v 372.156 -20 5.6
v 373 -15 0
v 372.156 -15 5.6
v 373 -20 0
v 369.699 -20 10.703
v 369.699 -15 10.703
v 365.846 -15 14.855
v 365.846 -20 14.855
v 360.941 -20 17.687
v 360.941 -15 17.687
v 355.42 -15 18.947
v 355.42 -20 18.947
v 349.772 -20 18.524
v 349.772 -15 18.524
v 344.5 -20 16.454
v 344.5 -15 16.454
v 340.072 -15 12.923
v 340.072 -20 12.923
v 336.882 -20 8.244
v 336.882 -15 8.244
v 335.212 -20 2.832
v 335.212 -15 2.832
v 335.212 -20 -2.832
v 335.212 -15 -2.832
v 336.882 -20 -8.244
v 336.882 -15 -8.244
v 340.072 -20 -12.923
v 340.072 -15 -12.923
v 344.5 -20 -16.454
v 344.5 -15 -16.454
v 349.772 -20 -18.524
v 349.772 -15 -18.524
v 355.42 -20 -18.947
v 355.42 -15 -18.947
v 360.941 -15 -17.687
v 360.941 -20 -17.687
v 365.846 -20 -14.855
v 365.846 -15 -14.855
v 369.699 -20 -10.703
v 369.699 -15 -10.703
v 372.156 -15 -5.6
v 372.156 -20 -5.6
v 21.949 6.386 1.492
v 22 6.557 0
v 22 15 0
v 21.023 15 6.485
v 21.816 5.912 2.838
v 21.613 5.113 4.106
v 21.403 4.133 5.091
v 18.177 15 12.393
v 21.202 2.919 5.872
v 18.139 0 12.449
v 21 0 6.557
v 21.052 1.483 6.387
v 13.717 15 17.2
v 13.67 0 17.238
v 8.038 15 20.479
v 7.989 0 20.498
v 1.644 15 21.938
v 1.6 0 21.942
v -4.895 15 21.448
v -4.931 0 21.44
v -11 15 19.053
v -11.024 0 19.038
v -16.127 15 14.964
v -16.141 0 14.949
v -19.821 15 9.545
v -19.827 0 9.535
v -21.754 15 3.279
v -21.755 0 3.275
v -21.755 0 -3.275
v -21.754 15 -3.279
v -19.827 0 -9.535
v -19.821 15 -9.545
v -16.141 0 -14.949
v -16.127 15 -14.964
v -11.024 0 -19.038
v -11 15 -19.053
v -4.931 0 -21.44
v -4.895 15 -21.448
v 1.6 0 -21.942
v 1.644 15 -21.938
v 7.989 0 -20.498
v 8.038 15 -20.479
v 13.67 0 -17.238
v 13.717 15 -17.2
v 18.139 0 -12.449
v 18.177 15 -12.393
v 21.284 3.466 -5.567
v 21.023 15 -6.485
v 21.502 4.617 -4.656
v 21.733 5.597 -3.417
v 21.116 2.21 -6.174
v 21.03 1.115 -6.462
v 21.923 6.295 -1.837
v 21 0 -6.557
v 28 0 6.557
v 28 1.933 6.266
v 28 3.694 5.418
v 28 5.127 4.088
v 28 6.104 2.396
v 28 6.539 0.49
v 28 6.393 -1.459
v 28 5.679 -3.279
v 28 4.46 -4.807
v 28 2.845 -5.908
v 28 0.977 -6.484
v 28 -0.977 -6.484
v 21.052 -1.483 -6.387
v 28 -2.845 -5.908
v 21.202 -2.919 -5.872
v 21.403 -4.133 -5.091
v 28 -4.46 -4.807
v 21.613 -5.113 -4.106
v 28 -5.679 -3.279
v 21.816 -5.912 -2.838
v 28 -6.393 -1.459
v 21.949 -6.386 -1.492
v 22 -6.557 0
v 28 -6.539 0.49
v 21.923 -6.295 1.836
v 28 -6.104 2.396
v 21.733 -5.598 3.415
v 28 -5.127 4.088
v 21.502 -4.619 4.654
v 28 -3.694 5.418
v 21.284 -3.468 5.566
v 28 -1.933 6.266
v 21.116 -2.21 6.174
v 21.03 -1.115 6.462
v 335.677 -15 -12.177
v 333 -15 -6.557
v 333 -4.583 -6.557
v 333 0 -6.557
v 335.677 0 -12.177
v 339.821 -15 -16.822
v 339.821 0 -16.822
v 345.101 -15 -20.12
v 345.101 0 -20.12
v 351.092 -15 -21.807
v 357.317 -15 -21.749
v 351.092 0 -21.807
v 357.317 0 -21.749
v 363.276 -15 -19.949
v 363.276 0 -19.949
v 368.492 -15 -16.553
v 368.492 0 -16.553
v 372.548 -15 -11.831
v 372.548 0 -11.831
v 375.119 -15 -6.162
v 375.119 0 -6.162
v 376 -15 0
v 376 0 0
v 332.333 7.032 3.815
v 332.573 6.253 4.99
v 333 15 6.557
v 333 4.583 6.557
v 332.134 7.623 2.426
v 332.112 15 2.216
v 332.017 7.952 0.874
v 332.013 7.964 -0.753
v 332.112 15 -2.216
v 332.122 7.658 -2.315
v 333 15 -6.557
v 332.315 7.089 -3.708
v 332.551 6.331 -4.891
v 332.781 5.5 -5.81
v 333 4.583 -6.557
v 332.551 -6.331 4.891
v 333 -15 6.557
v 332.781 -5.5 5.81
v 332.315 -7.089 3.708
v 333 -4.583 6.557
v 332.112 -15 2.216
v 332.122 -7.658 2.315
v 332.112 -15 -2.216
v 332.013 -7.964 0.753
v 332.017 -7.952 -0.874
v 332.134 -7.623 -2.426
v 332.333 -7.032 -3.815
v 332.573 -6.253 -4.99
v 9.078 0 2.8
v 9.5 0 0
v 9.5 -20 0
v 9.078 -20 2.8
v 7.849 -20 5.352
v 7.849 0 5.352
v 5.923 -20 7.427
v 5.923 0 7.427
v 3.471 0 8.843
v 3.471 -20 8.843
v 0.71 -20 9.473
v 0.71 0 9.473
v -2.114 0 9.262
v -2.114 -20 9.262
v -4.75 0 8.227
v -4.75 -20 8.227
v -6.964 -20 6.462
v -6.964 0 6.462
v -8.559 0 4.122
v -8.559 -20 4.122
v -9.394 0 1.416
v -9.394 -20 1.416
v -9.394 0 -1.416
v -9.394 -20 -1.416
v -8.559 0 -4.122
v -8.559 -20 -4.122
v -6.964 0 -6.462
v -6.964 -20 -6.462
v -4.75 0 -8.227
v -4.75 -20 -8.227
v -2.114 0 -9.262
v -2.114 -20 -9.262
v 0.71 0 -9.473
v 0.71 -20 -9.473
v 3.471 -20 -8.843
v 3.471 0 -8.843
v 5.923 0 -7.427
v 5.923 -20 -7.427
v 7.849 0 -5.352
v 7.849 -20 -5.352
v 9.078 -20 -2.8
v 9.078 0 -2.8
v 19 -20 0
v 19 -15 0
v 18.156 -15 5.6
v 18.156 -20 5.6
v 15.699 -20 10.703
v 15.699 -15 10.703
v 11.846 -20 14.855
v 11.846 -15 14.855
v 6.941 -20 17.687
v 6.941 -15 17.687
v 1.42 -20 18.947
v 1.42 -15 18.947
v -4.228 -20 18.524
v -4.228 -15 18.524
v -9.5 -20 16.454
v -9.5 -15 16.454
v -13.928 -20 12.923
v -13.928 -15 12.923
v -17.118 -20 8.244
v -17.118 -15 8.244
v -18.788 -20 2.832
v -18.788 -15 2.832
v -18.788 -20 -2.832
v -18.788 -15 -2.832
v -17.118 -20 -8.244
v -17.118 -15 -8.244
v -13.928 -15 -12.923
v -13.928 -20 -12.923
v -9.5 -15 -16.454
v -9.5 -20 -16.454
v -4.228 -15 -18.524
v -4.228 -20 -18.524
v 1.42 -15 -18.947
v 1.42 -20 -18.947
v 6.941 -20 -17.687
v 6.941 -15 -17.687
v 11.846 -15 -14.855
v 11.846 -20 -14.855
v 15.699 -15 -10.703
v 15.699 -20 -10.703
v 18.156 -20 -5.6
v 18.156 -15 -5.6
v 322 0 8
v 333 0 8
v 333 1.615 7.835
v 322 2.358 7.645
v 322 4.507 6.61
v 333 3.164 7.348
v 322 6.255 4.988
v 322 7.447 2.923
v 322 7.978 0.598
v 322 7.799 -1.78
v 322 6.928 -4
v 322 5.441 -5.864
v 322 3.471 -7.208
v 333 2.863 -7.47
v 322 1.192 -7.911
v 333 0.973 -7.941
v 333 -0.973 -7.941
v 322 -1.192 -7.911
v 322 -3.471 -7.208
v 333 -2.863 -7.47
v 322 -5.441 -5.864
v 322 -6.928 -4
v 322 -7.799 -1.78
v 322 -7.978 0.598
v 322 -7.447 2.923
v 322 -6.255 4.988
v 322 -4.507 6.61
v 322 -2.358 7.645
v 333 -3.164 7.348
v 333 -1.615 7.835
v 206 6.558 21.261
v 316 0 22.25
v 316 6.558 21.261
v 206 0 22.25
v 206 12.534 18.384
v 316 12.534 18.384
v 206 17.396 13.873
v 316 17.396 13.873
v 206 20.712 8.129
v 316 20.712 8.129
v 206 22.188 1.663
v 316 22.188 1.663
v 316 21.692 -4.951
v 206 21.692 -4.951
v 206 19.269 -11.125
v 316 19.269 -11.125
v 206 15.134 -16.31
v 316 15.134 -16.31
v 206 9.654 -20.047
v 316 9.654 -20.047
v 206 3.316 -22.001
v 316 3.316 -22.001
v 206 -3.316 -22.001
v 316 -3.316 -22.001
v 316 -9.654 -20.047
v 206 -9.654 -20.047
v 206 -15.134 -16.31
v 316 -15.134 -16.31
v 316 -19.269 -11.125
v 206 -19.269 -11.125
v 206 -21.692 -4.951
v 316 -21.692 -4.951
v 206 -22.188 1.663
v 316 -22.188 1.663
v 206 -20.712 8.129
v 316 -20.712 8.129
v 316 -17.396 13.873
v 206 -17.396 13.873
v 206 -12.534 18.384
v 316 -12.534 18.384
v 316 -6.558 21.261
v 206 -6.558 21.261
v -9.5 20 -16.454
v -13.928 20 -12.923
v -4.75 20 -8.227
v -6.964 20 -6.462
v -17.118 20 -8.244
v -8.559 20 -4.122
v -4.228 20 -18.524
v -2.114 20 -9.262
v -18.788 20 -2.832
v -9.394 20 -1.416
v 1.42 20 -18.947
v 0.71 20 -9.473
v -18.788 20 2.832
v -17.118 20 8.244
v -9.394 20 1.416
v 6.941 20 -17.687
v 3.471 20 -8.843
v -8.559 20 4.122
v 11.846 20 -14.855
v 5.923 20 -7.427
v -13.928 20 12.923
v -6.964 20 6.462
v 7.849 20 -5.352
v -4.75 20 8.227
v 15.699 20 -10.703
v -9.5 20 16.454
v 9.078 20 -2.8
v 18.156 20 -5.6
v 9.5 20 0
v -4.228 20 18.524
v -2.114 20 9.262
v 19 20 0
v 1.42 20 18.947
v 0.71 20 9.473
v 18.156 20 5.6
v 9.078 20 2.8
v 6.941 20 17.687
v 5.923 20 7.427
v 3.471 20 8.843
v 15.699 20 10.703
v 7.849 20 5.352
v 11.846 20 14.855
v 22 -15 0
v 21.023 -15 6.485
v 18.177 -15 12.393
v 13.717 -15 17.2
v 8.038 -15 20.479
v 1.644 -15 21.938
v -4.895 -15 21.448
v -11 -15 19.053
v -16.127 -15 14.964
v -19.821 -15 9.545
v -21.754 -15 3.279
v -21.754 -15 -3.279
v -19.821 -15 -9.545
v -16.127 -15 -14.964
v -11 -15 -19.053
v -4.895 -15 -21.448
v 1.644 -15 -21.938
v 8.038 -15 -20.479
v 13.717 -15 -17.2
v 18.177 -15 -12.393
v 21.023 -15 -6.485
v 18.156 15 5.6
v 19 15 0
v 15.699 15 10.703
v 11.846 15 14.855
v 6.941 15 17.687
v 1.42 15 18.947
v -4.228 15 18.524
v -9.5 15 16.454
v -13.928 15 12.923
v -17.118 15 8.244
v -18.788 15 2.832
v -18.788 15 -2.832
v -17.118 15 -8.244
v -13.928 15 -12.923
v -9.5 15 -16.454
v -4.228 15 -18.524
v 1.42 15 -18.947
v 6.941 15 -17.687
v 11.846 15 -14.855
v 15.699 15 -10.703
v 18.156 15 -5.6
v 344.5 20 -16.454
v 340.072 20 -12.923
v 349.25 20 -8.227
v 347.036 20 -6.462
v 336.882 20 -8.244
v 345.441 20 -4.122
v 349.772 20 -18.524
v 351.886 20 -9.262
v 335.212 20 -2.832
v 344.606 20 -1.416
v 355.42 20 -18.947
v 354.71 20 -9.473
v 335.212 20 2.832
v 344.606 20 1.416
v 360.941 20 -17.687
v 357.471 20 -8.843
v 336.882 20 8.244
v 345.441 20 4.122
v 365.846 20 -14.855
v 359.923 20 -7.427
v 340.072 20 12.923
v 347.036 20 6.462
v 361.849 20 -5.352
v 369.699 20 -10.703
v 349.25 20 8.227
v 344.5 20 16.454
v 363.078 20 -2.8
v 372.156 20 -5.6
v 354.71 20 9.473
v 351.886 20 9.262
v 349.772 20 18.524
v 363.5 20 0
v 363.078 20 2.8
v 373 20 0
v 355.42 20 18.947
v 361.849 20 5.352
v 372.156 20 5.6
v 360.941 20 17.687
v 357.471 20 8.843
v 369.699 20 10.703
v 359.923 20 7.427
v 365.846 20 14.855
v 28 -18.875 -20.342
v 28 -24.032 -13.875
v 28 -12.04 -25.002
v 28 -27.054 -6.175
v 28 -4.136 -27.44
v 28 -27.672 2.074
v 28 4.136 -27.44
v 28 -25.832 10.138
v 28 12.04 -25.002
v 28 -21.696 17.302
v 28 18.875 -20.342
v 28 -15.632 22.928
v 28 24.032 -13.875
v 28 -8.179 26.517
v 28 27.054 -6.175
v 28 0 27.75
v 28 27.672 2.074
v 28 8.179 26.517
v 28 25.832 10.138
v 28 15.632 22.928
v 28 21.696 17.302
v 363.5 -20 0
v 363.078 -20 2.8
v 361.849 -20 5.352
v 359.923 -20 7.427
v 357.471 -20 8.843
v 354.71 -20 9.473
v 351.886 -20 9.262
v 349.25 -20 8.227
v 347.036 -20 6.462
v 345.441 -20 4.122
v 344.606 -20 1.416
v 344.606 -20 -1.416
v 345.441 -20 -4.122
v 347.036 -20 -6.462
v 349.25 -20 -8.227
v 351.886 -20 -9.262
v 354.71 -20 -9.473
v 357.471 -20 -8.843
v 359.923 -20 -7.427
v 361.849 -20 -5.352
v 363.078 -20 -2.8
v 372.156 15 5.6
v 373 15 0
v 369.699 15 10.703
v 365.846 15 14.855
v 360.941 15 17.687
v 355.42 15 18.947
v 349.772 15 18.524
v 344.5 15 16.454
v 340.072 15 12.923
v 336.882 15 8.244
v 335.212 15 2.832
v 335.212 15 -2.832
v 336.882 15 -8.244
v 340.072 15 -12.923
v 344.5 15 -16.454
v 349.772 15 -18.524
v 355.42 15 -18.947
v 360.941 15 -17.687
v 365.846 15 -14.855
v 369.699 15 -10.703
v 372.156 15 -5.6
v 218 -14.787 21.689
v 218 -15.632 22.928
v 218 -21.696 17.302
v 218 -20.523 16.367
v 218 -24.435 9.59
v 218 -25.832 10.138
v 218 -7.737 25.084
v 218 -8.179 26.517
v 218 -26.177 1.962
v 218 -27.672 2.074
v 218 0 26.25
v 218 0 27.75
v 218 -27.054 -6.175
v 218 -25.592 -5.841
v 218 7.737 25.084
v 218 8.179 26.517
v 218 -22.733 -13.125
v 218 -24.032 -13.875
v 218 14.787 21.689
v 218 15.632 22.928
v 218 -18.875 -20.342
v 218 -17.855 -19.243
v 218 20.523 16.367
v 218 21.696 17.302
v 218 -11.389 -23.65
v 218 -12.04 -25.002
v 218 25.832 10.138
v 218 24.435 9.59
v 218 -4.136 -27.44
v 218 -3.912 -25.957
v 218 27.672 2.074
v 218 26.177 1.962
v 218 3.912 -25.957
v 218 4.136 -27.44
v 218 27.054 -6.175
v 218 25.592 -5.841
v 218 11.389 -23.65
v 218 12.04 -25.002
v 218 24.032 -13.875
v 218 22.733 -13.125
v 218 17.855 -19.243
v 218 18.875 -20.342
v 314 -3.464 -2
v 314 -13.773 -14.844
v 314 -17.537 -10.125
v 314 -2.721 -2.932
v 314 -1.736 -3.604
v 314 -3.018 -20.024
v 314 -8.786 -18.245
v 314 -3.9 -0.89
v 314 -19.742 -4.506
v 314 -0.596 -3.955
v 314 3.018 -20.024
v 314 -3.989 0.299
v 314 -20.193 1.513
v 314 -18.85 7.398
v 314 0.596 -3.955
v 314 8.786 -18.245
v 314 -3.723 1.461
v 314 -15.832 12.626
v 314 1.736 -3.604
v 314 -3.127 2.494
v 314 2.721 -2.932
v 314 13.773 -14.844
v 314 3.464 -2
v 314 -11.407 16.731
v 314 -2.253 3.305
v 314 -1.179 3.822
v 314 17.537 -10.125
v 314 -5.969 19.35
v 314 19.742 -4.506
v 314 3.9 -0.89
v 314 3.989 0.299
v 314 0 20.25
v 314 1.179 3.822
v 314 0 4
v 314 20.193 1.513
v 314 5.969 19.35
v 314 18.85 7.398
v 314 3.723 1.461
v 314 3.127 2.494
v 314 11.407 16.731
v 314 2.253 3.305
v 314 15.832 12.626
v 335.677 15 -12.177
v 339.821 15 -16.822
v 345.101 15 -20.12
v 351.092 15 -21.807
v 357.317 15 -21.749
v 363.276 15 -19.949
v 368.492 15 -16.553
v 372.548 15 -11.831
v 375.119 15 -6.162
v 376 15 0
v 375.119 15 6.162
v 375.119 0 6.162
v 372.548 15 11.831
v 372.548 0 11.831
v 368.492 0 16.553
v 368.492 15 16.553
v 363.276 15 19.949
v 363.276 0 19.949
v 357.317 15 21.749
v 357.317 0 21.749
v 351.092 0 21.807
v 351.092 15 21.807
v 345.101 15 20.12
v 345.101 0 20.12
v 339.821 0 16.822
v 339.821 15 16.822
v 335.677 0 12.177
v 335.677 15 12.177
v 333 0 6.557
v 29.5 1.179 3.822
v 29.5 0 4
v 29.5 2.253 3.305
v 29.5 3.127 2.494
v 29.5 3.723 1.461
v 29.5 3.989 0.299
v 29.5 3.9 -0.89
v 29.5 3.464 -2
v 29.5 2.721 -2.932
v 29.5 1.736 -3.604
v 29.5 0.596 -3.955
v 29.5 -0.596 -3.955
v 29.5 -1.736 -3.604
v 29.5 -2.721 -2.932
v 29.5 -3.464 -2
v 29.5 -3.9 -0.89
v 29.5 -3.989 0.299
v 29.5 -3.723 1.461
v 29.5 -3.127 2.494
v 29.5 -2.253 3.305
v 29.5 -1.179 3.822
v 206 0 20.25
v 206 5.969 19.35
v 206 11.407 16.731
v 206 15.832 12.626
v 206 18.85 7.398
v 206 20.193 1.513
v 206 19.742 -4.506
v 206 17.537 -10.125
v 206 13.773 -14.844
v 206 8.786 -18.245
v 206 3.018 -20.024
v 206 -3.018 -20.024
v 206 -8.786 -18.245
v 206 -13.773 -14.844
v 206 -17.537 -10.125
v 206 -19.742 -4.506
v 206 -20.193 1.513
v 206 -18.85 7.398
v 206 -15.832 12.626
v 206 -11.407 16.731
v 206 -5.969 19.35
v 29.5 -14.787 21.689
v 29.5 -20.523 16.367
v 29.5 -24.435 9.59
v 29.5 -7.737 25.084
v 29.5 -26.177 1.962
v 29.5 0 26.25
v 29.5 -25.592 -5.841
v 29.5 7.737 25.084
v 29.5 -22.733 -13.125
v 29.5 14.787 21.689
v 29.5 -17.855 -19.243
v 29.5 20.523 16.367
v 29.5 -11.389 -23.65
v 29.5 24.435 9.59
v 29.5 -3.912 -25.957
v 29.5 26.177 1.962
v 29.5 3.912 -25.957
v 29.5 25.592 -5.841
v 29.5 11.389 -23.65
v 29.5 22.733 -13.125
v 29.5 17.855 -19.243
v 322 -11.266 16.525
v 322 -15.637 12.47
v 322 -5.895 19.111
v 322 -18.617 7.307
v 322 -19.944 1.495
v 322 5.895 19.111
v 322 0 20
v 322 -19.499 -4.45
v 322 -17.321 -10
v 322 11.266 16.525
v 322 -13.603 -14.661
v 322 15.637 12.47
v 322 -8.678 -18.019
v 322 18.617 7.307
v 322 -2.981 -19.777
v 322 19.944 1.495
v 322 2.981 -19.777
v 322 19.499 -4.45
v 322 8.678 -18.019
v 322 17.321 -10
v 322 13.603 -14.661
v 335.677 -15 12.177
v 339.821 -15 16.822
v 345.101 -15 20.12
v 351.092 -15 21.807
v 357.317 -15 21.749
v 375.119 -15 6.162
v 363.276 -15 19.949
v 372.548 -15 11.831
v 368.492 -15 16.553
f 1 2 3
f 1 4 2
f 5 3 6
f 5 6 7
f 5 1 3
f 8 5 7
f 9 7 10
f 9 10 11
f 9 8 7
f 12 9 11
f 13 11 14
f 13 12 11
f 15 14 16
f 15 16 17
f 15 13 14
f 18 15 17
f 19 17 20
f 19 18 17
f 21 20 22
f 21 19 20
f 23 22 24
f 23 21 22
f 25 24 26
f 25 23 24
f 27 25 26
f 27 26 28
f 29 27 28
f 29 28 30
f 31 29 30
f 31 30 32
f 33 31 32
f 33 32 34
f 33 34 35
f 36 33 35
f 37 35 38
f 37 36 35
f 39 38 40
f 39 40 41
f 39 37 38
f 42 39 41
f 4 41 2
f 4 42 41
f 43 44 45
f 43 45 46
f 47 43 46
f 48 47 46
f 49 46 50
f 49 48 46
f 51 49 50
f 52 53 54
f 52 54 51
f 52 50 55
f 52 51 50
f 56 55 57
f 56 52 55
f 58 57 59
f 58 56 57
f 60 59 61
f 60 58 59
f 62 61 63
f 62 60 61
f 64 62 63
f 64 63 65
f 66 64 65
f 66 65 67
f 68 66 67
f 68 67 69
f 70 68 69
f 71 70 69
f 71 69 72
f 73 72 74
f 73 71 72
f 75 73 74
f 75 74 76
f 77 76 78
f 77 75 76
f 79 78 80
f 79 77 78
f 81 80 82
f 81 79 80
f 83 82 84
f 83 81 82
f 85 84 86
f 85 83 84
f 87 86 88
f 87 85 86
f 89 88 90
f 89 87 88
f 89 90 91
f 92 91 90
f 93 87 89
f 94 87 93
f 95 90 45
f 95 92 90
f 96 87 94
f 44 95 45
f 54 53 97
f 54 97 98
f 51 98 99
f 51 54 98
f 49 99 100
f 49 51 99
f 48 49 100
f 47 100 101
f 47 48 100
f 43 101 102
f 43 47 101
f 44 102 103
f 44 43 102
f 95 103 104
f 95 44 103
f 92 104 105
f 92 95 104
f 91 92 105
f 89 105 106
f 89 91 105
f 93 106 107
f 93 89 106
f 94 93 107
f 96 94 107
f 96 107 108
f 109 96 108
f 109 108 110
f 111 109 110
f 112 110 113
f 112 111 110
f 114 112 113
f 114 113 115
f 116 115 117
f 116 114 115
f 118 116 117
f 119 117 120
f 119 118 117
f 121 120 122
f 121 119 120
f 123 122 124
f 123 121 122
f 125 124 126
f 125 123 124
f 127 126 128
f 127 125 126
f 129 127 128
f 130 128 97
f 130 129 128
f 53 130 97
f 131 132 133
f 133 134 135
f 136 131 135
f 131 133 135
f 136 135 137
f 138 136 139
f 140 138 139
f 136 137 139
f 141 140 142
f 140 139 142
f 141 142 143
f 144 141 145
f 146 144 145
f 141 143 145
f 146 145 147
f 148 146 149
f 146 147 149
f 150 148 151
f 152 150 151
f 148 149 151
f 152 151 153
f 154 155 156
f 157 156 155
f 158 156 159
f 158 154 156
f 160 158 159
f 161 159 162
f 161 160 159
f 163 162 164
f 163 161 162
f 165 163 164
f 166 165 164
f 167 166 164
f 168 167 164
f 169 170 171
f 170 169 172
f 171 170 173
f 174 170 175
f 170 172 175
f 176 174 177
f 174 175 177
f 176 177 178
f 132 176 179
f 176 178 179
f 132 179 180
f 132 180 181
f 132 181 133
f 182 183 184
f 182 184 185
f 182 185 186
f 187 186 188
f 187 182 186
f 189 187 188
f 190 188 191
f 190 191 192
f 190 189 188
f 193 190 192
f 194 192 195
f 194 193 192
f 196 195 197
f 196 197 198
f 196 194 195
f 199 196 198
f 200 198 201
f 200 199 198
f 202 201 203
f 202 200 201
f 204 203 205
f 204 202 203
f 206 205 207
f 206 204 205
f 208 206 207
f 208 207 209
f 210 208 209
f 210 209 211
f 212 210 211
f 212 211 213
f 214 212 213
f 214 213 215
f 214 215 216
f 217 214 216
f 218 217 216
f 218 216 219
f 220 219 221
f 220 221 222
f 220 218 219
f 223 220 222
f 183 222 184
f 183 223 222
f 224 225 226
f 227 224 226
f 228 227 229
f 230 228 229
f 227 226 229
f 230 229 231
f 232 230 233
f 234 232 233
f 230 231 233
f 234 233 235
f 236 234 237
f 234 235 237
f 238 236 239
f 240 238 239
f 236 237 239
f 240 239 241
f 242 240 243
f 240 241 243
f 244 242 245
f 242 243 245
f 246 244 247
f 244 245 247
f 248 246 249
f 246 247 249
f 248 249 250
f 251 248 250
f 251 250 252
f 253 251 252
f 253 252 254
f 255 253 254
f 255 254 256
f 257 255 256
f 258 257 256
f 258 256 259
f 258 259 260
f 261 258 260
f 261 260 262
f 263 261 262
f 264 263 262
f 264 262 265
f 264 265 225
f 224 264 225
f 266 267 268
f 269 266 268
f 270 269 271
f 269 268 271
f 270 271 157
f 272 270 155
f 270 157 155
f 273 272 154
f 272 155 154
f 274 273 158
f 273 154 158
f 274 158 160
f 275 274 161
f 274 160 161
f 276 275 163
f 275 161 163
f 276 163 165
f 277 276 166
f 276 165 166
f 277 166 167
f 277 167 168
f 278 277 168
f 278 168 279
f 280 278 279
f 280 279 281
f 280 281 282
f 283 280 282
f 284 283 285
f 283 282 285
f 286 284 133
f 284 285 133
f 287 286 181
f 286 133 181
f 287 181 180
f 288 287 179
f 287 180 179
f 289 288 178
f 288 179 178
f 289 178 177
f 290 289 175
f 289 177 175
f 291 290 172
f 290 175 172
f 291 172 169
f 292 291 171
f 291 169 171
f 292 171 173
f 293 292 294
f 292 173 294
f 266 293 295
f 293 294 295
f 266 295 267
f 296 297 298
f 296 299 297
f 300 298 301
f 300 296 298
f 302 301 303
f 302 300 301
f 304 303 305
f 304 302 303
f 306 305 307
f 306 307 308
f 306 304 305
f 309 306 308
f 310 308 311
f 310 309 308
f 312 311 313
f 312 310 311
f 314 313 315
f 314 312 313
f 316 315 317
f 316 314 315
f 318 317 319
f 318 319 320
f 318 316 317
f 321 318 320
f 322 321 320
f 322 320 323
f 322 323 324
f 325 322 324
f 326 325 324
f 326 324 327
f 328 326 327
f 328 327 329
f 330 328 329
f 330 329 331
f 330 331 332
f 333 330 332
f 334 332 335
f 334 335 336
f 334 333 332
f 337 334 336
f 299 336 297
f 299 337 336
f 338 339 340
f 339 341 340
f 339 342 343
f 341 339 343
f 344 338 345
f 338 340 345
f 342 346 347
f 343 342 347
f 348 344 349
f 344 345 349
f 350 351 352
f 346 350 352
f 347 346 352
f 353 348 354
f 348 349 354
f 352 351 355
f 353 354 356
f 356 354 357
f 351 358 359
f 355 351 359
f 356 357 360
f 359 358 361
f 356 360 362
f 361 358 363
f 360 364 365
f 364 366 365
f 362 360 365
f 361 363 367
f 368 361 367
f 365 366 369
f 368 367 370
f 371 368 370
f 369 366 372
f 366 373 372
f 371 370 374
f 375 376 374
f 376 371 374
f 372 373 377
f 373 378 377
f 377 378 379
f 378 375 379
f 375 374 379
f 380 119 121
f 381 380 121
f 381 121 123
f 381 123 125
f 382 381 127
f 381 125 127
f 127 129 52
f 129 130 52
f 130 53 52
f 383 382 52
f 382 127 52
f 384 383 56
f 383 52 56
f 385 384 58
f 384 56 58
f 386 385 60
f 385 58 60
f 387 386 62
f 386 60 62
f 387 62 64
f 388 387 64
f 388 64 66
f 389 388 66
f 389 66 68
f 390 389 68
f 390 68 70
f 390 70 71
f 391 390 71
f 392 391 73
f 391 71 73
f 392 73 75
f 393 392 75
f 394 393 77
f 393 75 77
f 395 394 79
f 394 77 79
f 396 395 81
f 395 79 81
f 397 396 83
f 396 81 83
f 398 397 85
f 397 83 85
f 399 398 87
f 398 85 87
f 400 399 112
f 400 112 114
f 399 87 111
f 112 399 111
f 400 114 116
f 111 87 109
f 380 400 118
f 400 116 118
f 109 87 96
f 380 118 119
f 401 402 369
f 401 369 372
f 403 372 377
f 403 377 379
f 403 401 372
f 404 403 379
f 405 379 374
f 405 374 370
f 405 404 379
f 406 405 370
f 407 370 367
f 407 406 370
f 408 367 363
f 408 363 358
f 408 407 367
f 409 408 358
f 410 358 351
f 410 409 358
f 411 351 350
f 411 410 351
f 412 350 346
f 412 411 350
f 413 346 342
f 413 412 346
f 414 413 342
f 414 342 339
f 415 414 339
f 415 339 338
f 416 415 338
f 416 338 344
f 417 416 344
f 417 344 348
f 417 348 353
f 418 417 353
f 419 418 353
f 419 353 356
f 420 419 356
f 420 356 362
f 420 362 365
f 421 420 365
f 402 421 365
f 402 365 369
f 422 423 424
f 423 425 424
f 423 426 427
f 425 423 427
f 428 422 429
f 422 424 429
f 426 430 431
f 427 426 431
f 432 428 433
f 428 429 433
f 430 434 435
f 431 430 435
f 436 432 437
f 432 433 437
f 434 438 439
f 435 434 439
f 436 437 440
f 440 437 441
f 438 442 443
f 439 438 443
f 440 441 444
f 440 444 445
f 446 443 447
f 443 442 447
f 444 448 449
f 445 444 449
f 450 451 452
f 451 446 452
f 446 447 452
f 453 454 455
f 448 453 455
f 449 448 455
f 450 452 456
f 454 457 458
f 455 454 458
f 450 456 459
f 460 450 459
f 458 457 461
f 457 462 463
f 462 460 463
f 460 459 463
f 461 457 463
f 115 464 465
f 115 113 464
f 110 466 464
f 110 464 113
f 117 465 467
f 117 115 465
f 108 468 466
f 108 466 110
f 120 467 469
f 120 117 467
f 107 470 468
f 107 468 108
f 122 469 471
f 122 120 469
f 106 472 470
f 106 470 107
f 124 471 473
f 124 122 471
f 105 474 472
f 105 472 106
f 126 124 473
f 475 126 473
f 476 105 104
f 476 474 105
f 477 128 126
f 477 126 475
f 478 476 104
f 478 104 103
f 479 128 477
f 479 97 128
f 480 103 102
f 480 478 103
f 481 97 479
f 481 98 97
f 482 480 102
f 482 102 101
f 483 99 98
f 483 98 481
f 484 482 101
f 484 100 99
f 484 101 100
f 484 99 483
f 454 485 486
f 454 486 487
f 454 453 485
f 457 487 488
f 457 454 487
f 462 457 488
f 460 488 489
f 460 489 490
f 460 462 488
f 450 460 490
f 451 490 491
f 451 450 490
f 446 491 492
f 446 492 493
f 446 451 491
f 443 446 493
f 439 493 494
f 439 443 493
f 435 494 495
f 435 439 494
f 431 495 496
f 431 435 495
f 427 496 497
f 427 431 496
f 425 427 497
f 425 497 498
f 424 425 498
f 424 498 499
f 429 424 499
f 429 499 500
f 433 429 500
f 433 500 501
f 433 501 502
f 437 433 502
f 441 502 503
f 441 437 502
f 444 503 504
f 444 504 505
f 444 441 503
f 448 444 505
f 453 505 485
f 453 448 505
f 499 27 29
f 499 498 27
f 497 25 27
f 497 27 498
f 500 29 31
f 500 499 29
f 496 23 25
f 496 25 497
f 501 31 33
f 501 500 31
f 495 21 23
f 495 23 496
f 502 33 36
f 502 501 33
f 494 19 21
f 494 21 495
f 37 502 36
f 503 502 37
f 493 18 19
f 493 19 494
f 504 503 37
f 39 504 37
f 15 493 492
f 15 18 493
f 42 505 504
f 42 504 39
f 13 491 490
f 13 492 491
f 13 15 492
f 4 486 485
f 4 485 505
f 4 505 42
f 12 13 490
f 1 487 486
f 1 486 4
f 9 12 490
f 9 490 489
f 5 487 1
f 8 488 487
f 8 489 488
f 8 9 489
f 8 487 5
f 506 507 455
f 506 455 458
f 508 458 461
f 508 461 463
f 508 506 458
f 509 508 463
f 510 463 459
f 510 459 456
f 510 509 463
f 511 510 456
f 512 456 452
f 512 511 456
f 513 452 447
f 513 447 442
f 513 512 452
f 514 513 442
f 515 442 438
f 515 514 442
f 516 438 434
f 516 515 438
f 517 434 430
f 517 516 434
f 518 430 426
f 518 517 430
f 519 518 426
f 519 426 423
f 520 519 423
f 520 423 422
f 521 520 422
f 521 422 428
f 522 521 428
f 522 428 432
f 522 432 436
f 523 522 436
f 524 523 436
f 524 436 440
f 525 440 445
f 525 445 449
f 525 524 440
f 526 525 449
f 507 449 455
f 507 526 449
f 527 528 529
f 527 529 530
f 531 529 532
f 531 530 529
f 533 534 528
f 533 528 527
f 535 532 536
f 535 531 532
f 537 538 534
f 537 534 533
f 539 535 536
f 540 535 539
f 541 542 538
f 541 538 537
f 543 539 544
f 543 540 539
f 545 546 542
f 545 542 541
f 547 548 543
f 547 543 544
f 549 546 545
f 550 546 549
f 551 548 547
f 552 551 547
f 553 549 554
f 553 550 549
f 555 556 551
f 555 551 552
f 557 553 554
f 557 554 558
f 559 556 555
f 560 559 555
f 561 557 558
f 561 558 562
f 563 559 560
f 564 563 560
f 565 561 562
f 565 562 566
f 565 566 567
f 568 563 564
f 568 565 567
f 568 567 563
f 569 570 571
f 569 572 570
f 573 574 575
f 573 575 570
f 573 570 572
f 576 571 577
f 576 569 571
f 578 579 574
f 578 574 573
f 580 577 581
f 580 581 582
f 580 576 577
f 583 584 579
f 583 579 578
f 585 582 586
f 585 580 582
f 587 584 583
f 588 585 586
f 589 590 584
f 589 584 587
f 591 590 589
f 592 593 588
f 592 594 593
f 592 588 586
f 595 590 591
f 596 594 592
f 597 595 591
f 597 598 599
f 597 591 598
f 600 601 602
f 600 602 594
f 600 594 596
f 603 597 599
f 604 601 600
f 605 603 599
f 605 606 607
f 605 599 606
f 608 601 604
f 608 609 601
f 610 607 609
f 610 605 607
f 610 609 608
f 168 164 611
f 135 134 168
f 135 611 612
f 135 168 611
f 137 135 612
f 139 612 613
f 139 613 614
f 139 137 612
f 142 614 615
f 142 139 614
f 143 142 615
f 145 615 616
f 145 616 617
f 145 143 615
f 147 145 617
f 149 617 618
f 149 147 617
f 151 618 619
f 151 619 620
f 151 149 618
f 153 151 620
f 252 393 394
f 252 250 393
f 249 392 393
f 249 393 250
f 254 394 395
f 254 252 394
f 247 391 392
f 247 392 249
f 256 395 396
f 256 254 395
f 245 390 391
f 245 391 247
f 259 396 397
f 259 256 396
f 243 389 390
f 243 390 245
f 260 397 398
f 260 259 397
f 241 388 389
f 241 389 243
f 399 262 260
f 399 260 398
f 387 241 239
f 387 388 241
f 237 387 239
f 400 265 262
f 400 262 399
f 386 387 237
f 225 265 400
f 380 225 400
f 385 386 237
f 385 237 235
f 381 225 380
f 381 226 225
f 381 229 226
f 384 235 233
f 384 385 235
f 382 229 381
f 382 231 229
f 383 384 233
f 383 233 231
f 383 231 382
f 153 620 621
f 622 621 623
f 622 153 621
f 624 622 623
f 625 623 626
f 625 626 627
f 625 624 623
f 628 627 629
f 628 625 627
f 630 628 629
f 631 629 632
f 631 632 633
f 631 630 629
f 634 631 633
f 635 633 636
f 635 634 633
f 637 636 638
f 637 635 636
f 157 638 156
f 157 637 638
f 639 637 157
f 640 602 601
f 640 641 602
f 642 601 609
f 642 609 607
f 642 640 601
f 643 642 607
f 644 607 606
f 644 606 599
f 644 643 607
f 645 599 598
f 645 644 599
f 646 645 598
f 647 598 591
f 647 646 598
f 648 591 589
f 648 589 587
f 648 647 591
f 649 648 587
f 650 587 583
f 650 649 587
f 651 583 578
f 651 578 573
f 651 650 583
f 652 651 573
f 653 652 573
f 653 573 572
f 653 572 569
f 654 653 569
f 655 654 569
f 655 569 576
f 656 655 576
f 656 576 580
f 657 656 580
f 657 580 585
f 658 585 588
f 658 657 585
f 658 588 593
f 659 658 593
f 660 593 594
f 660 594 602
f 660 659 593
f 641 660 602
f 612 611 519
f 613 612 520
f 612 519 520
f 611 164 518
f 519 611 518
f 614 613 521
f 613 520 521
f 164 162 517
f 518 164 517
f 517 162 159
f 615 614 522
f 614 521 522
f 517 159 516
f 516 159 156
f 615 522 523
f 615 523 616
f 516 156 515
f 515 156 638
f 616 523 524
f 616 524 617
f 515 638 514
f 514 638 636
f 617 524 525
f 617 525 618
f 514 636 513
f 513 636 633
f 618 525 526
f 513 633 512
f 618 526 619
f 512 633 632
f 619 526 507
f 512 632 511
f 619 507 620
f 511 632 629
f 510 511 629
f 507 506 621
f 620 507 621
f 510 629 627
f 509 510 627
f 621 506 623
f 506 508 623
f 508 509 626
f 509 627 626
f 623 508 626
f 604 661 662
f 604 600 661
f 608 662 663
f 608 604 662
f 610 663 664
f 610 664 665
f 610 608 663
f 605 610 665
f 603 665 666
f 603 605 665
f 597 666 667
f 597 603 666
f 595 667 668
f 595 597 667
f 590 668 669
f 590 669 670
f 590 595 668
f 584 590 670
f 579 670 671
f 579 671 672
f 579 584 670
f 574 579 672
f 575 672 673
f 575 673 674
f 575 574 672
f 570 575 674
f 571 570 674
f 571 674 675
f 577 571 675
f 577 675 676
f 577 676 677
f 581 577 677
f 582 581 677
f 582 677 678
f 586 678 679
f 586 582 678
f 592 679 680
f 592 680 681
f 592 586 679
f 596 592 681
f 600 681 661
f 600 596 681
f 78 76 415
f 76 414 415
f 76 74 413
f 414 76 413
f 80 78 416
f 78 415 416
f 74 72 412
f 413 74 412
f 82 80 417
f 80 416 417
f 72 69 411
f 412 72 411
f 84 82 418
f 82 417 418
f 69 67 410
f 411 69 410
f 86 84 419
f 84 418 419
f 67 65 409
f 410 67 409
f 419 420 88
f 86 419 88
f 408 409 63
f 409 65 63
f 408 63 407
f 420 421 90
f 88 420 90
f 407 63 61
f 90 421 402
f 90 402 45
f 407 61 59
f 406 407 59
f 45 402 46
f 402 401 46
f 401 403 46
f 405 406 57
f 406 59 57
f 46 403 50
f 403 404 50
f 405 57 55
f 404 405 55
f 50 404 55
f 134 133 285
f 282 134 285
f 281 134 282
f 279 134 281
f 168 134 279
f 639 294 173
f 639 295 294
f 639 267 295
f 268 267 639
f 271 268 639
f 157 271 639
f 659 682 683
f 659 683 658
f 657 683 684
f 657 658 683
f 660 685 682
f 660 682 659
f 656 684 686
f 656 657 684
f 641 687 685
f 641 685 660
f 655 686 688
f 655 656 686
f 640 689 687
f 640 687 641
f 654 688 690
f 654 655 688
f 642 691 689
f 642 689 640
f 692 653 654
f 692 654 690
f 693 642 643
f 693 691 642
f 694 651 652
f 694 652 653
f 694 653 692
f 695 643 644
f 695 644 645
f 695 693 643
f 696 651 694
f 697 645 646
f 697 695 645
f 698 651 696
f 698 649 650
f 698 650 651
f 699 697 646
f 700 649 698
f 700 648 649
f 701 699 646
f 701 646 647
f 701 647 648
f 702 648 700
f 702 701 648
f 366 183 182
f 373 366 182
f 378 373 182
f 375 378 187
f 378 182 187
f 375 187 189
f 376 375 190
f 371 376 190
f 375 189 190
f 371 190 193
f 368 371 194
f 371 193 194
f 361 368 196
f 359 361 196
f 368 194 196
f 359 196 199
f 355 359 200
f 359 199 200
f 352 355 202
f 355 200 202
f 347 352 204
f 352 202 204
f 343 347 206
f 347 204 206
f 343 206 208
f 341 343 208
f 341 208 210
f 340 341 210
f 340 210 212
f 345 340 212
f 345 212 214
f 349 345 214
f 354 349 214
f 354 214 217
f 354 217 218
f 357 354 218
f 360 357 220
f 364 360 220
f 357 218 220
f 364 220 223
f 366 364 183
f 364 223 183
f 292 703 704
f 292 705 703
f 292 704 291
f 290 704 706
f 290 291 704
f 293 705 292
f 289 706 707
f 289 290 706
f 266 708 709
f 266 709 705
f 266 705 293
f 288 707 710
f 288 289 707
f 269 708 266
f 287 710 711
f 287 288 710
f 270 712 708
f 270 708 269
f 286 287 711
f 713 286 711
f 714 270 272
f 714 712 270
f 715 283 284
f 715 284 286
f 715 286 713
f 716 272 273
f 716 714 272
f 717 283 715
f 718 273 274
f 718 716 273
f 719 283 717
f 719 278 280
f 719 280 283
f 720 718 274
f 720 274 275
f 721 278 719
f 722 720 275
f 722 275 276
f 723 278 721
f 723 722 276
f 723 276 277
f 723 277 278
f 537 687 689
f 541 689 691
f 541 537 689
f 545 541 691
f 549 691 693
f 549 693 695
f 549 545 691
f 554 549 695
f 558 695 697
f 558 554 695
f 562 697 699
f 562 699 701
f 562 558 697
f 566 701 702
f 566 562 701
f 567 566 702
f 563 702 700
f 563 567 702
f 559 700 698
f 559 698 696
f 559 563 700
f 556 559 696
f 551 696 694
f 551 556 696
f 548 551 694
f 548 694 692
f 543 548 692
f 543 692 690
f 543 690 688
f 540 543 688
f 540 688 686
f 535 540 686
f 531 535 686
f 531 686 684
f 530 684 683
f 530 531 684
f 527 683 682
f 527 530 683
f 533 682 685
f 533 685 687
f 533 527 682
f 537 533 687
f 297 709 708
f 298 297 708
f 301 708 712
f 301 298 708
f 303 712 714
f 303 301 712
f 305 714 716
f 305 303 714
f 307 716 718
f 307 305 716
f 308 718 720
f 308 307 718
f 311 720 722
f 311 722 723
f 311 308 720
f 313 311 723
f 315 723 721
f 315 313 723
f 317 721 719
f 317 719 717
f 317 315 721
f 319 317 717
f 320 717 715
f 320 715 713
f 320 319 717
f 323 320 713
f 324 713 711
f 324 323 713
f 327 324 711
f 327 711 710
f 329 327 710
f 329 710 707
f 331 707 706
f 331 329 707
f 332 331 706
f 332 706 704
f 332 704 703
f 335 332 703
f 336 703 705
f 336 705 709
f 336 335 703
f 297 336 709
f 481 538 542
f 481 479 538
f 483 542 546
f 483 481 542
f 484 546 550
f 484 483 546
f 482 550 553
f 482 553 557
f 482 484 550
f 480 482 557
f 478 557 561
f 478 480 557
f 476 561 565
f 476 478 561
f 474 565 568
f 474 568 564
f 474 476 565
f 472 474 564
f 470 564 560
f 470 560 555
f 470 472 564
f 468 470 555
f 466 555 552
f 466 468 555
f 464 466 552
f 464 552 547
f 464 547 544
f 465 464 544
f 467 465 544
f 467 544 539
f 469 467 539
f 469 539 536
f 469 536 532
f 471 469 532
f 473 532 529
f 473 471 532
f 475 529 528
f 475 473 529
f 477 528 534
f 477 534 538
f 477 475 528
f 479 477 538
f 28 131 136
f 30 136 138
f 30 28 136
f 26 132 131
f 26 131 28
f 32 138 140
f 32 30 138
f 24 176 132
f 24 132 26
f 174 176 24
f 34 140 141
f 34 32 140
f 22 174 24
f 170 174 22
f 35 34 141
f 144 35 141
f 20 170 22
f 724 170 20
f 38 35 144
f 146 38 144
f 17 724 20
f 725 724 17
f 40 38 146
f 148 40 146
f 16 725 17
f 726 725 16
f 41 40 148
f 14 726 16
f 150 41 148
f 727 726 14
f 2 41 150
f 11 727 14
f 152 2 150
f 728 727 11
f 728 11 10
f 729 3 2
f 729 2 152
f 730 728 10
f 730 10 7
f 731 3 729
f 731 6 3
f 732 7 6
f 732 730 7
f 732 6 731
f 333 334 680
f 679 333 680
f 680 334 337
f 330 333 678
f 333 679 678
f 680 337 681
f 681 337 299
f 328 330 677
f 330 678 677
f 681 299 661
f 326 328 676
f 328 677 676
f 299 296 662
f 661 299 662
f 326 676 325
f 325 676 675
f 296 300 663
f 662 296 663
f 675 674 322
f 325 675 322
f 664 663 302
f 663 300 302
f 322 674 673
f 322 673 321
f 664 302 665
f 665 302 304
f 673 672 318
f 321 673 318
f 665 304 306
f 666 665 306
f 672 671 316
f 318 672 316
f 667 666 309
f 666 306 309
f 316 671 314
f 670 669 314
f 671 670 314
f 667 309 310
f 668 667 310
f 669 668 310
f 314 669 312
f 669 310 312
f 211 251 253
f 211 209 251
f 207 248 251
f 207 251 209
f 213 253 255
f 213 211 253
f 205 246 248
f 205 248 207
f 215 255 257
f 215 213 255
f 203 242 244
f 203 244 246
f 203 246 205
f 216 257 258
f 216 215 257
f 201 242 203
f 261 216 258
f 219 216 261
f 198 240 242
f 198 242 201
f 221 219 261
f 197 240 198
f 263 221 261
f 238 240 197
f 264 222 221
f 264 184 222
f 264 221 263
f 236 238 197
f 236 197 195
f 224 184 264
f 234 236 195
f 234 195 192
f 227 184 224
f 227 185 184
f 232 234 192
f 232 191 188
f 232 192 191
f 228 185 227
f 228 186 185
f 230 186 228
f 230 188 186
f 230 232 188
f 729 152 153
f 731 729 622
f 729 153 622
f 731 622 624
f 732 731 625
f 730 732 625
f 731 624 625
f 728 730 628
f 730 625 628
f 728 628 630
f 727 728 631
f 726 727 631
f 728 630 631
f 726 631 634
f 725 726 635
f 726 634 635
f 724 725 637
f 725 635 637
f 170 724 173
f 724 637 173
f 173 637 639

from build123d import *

# Parameters (mm, degrees)
F0_W     = 188.5
F0_H     = 4
F0_W_2   = 12
F0_H_2   = 2
F0_W_3   = 11
F0_H_3   = 8
F0_W_4   = 96
F2_R     = 22
F2_R_2   = 19
F3_DEPTH = 15
F4_R     = 19
F4_R_2   = 9.5
F5_DEPTH = 20


with BuildPart() as f1:
    # F0 (on Front) → F1 (revolve)
    with BuildSketch(Plane.XZ):
        Polygon((28, 6.5574385243), (28, 0), (29.5, 0), (29.5, 4), (29.5, 26.25), (218, 26.25), (218, 27.75), (28, 27.75), align=None)
        with BuildLine():
            ThreePointArc((21, 6.5574385243), (21.7485631709, 3.3166247904), (22, 0))
            Line((22, 0), (28, 0))
            Line((28, 0), (28, 6.5574385243))
            Line((28, 6.5574385243), (21, 6.5574385243))
        make_face()
        with Locations((123.75, 2)):
            Rectangle(F0_W, F0_H)
        Polygon((314, 4), (314, 0), (316, 0), (316, 22.25), (218, 22.25), (218, 20.25), (314, 20.25), align=None)
        with Locations((212, 21.25)):
            Rectangle(F0_W_2, F0_H_2)
        Polygon((316, 22.25), (316, 0), (322, 0), (322, 8), (322, 20), align=None)
        with Locations((327.5, 4)):
            Rectangle(F0_W_3, F0_H_3)
        with Locations((266, 2)):
            Rectangle(F0_W_4, F0_H)
    revolve(axis=Axis((171.75, 0, 0), (-1, 0, 0)))

    # F2 (on Front) → F3 (join, symmetric)
    with BuildSketch(Plane.XZ):
        Circle(F2_R)
        Circle(F2_R_2, mode=Mode.SUBTRACT)
        with BuildLine():
            ThreePointArc((376, 0), (357.3166247904, 21.7485631709), (333, 6.5574385243))
            Line((333, 6.5574385243), (333, -6.5574385243))
            ThreePointArc((333, -6.5574385243), (357.3166247904, -21.7485631709), (376, 0))
        make_face()
        with Locations((354, 0)):
            Circle(F2_R_2, mode=Mode.SUBTRACT)
        with BuildLine():
            Line((333, -6.5574385243), (333, 6.5574385243))
            ThreePointArc((333, 6.5574385243), (332, 0), (333, -6.5574385243))
        make_face()
    extrude(amount=F3_DEPTH, both=True)

    # F4 (on Front) → F5 (join, symmetric)
    with BuildSketch(Plane.XZ):
        Circle(F4_R)
        Circle(F4_R_2, mode=Mode.SUBTRACT)
        with Locations((354, 0)):
            Circle(F4_R)
        with Locations((354, 0)):
            Circle(F4_R_2, mode=Mode.SUBTRACT)
    extrude(amount=F5_DEPTH, both=True)


solid = f1.part
